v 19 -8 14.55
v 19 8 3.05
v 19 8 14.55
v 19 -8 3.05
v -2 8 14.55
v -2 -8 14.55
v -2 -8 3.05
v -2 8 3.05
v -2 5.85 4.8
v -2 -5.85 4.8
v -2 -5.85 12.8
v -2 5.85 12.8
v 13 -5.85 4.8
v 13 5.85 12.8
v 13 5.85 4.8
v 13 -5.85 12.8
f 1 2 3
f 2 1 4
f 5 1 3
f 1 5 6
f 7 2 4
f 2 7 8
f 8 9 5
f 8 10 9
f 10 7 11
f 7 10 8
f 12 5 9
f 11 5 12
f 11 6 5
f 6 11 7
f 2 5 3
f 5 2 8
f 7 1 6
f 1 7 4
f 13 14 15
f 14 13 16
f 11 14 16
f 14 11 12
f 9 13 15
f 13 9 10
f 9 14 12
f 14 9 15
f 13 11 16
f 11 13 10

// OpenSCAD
// file: ../../screw-post/screw-post.scad
//-----------------------------------------------------------------------
// Screw post: a round post off the floor that a board screws down onto
//
// Two ways to fix:
//   "nut"  clearance hole through the post and floor; the nut sits in a hex
//          trap in the floor's underside, so the screw goes in from the top
//   "tap"  a pilot hole the screw cuts its own thread in (one or two fittings
//          in PLA/PETG); blind, the floor stays whole underneath
// and "head" for a screw up from below (head in a counterbore, nut on top).
//
// Modules, all in the same frame:
//   screwPostGhost()     the screw (and nut), for previews
//   screwPost()          the post: add to the floor
//   screwPostFloorCut()  subtract from the floor: nut trap / counterbore and hole
//
// Frame: origin on the floor top, on the post's axis. Z up; the floor is
// Z = -floorThick .. 0. Units: mm.
//
// Sizes: "M2", "M2.5", "M3". screwPostScrew(size, ...) says which screw length
// reaches, so a project can assert it has that screw in the kit.
//-----------------------------------------------------------------------

//-- [name, screw Ø, nut across flats, nut thick, head Ø, head height, tap hole, post Ø]
//-- Nuts ISO 4032; heads ISO 7380 button. Tap holes: the usual ~0.8 x Ø for plastic
screwSizes = [
  ["M2",   2.0, 4.0, 1.6, 3.5, 1.1, 1.6, 5.0],
  ["M2.5", 2.5, 5.0, 2.0, 4.4, 1.4, 2.1, 6.0],    // head 4.4: measured on the kit's M2.5 (controller base)
  ["M3",   3.0, 5.5, 2.4, 5.7, 1.65, 2.5, 7.0],
];

screwHoleClear = 0.4;     // added to the screw Ø for a clearance hole
screwNutClear  = 0.3;     // CAL: across flats, nut trap over the nut. Set by the fit piece
screwTapClear  = 0.0;     // CAL: added to the tap hole. Set by the fit piece
screwHeadClear = 0.6;     // counterbore over the head Ø

function screwSize(size) = let (i = search([size], screwSizes)[0])
  assert(i != [] && i != undef, str("unknown screw size ", size)) screwSizes[i];
function screwDia(size)    = screwSize(size)[1];
function screwNutAF(size)  = screwSize(size)[2];
function screwNutH(size)   = screwSize(size)[3];
function screwHeadDia(size)= screwSize(size)[4];
function screwHeadH(size)  = screwSize(size)[5];
function screwPostDia(size)= screwSize(size)[7];

//-- Shortest screw that fills the nut, from the top of the clamped part (h + clamp
//-- above the floor) down to the nut trap's underside. Round up to a length you have.
function screwPostScrew(size, h, floorThick, clamp = 1.6) = h + clamp + floorThick;

module screwPostGhost(size, h, floorThick, clamp = 1.6, length, how = "nut")
{
  d = screwDia(size);
  L = is_undef(length) ? screwPostScrew(size, h, floorThick, clamp) : length;
  top = h + clamp;
  if (how == "head")
  {
    %color("Silver") translate([0, 0, -floorThick]) cylinder(d = screwHeadDia(size), h = screwHeadH(size), $fn = 24);
    %color("Silver") translate([0, 0, -floorThick + screwHeadH(size)]) cylinder(d = d, h = L, $fn = 16);
  }
  else
  {
    %color("Silver") translate([0, 0, top]) cylinder(d = screwHeadDia(size), h = screwHeadH(size), $fn = 24);
    %color("Silver") translate([0, 0, top - L]) cylinder(d = d, h = L, $fn = 16);
    if (how == "nut")
      %color("DimGray") translate([0, 0, -floorThick]) rotate([0, 0, 30]) cylinder(d = screwNutAF(size)/cos(30), h = screwNutH(size), $fn = 6);
  }
}

//-- how: "nut" | "head" (through hole) or "tap" (blind pilot hole). postDia defaults by size
module screwPost(size, h, how = "nut", postDia, tapClear = screwTapClear)
{
  pd = is_undef(postDia) ? screwPostDia(size) : postDia;
  hole = how == "tap" ? screwSize(size)[6] + tapClear : screwDia(size) + screwHoleClear;
  difference()
  {
    translate([0, 0, -0.01]) cylinder(d = pd, h = h + 0.01, $fn = 40);
    translate([0, 0, how == "tap" ? 0.6 : -1]) cylinder(d = hole, h = h + 2, $fn = 24);
    //-- lead-in so the screw starts square
    translate([0, 0, h - 0.4]) cylinder(d1 = hole, d2 = hole + 0.8, h = 0.41, $fn = 24);
  }
}

//-- "nut": hex trap from the underside, opening a little over the nut so it sits flush.
//-- "head": counterbore for the head. "tap": nothing.
module screwPostFloorCut(size, floorThick, how = "nut", nutClear = screwNutClear)
{
  d = screwDia(size) + screwHoleClear;
  if (how == "nut")
  {
    af = screwNutAF(size) + nutClear;
    translate([0, 0, -floorThick - 1]) rotate([0, 0, 30]) cylinder(d = af/cos(30), h = screwNutH(size) + 0.1 + 1, $fn = 6);
    translate([0, 0, -floorThick - 1]) cylinder(d = d + 0.4, h = floorThick + 2, $fn = 24);
  }
  if (how == "head")
  {
    translate([0, 0, -floorThick - 1]) cylinder(d = screwHeadDia(size) + screwHeadClear, h = screwHeadH(size) + 0.2 + 1, $fn = 32);
    translate([0, 0, -floorThick - 1]) cylinder(d = d + 0.4, h = floorThick + 2, $fn = 24);
  }
  assert(how == "tap" || floorThick >= (how == "nut" ? screwNutH(size) : screwHeadH(size)) + 0.1 + 0.3,
         str("floor too thin for the ", size, " ", how));
}
// main file
// The jack body as a solid, for the catalogue: a block with the plug opening in its face.
include <../rj45-breakout.scad>

board = "pihut-106592"; wall = 2.0; postH = 4.2;
j  = rj45JackOf(board);
ex = rj45BoardEdgeX(wall, board);
az = rj45AxisZ(postH, board);
difference()
{
  translate([ex - j[4], -j[1]/2, postH + j[2]]) cube([j[5], j[1], j[3] - j[2]]);
  //-- plug opening: 11.7 wide, 8 tall (CAL, for the picture only), 15 deep
  translate([ex - j[4] - 1, -11.7/2, az - 4]) cube([16, 11.7, 8]);
}
